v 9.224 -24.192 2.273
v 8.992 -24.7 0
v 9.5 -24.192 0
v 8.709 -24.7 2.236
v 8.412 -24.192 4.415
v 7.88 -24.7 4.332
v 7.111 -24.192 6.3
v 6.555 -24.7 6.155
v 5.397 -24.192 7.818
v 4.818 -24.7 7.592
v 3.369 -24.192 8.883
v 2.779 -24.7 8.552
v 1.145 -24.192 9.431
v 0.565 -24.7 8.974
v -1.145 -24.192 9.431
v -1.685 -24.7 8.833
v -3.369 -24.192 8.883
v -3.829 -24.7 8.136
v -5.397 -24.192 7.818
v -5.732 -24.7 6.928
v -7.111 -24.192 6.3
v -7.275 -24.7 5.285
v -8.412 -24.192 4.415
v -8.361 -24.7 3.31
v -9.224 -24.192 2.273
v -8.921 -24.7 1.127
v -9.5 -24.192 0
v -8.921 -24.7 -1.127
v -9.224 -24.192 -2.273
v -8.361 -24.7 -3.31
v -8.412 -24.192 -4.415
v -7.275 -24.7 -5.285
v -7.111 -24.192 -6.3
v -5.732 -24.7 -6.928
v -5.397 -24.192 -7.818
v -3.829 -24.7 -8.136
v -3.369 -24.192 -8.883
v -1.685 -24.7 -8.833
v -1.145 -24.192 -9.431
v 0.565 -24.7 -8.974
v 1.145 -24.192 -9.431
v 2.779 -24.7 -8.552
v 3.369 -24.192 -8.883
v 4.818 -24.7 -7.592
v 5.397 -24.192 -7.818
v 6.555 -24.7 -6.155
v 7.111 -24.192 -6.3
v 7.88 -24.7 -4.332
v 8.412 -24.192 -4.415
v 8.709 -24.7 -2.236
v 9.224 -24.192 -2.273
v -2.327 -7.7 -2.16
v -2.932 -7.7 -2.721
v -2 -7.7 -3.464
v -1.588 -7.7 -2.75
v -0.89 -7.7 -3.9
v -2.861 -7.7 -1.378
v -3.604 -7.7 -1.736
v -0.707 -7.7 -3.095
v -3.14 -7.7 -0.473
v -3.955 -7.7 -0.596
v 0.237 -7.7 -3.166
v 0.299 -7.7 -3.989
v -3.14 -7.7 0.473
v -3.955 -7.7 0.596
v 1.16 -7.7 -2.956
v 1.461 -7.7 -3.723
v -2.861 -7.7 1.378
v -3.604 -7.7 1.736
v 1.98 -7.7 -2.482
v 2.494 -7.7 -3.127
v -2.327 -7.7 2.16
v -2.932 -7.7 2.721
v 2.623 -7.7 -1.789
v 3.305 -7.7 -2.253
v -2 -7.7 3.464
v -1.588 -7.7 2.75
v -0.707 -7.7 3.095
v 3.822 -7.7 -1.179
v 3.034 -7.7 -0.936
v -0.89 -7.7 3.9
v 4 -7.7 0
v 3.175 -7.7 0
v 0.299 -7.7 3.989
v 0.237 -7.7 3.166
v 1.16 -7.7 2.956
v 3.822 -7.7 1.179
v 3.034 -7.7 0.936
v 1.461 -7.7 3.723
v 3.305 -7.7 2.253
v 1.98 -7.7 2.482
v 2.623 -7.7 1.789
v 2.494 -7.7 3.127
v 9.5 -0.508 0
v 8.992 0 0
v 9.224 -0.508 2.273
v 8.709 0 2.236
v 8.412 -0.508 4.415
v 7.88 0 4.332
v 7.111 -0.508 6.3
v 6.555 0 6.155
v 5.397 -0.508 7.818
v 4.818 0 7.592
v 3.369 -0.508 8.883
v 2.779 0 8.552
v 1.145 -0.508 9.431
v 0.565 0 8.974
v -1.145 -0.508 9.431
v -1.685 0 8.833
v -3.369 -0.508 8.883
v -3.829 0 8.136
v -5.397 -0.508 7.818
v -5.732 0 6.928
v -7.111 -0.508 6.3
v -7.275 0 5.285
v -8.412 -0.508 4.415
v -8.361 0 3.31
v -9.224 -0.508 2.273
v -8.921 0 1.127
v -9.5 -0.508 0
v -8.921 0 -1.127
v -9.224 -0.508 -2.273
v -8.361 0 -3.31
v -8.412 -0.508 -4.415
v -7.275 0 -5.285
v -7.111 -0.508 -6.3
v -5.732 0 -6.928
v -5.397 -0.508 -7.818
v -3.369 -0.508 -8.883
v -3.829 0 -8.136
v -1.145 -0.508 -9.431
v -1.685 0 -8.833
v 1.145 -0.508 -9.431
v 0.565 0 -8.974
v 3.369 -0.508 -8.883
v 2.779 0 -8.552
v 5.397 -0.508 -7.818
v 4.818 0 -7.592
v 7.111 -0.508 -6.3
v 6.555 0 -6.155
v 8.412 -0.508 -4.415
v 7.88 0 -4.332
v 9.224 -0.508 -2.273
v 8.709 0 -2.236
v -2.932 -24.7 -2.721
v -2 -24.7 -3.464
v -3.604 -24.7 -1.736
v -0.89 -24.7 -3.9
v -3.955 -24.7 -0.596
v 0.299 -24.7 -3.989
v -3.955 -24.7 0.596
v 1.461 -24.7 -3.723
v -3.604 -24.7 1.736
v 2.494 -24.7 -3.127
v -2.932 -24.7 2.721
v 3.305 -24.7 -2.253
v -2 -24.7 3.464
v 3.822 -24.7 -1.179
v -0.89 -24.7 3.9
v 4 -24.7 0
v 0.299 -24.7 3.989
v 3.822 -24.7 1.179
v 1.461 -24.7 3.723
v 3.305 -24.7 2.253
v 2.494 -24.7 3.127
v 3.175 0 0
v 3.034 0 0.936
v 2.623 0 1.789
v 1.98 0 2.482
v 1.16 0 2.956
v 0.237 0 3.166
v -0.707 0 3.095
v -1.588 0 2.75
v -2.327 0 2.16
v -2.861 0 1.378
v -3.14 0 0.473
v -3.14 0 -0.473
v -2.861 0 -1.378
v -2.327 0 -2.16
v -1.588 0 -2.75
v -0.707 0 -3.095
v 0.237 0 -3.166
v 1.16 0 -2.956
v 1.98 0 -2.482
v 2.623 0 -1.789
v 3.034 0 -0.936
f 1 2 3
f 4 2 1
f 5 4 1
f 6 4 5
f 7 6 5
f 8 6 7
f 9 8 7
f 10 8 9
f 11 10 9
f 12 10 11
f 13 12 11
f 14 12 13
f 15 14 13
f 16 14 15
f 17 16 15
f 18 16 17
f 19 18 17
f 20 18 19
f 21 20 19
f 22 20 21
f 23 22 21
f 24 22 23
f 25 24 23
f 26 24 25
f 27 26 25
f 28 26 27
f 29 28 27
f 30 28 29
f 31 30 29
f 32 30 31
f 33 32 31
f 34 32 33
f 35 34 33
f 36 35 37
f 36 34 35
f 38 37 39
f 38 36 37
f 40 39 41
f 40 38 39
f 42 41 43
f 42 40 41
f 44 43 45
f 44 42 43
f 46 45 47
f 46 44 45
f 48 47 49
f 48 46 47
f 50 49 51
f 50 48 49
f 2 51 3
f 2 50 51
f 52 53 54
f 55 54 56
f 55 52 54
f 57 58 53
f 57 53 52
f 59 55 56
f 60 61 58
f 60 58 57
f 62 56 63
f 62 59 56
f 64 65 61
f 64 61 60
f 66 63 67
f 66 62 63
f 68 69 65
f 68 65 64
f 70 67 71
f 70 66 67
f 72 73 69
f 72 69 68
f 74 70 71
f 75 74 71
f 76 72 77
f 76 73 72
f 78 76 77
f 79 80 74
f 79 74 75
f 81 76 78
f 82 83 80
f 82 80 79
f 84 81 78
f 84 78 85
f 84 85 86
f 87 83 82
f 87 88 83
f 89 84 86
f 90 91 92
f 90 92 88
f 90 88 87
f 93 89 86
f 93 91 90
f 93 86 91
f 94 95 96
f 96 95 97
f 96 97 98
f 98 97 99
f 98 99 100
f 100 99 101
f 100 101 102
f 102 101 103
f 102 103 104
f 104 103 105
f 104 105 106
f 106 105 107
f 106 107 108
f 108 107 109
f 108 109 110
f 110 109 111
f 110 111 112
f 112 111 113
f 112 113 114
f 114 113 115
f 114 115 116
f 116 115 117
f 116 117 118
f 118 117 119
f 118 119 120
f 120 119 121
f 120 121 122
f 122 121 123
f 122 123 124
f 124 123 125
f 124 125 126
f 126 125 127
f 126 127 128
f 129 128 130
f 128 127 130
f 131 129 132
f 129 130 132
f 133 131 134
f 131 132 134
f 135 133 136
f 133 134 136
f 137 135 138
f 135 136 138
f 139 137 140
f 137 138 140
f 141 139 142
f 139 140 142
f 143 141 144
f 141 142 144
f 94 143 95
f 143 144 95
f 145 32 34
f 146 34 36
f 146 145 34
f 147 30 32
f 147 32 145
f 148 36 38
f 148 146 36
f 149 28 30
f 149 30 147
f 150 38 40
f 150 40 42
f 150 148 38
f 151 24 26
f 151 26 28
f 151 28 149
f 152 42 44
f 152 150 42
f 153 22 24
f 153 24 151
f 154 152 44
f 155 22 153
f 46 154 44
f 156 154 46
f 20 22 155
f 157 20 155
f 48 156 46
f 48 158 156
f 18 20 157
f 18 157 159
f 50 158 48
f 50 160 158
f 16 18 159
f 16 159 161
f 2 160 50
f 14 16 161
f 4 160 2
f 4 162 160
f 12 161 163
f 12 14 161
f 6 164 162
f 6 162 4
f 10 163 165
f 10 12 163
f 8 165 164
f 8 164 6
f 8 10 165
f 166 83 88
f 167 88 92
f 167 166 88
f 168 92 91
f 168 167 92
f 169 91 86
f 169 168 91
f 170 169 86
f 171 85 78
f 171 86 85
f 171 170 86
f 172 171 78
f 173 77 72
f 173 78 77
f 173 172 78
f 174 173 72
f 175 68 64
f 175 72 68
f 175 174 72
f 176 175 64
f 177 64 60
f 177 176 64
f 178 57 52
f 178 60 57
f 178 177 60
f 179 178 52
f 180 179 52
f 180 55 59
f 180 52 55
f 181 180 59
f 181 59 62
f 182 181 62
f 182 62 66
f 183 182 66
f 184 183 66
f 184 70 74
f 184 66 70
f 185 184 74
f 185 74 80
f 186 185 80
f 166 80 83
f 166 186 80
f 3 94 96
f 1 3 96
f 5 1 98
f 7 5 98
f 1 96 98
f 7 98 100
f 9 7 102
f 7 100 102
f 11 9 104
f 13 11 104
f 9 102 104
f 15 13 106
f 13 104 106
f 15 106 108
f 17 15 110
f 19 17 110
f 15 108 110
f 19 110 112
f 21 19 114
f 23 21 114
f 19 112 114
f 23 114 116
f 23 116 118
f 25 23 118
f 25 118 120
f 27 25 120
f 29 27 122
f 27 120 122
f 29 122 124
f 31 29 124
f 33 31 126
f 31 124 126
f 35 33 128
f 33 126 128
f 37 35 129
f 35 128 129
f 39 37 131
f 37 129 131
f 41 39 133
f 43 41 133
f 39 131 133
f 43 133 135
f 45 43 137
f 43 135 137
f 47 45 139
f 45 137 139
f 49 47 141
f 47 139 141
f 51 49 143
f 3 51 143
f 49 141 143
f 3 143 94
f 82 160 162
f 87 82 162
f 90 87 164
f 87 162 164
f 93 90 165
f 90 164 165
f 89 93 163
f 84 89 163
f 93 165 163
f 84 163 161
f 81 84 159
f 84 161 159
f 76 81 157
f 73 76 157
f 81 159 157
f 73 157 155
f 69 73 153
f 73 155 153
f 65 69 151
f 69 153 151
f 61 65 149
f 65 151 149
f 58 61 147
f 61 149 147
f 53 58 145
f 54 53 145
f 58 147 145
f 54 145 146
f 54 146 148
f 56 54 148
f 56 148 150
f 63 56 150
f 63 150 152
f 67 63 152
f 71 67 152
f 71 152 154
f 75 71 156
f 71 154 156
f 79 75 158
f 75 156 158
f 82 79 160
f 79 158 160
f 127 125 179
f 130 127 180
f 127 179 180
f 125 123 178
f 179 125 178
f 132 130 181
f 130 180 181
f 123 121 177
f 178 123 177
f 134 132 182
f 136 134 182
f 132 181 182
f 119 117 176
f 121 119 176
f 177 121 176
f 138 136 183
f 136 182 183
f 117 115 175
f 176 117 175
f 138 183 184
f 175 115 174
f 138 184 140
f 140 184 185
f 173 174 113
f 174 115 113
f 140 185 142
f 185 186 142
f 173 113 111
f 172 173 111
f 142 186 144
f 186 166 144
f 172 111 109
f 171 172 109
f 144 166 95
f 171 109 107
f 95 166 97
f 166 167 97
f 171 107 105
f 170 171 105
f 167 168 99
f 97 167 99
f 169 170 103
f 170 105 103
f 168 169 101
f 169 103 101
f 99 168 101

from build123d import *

# Parameters (mm, degrees)
F0_R     = 9.5
F0_R_2   = 3.175
F1_DEPTH = 24.7
F2_R     = 4
F3_DEPTH = 17
F4_SIZE  = 0.508


with BuildPart() as f1:
    # F0 (on Front) → F1 (new body)
    with BuildSketch(Plane.XZ):
        Circle(F0_R)
        Circle(F0_R_2, mode=Mode.SUBTRACT)
    extrude(amount=F1_DEPTH)

    # F2 (on face) → F3 (cut)
    with BuildSketch(Plane.XZ.offset(24.7)):
        Circle(F2_R)
    extrude(amount=-F3_DEPTH, mode=Mode.SUBTRACT)

    # F4
    f4_edges = [f1.edges().sort_by_distance(p)[0] for p in [
        (9.5, -12.35, 0),
        (-9.5, 0, 0),
        (-9.5, -24.7, 0),
    ]]
    chamfer(f4_edges, length=F4_SIZE)


solid = f1.part
